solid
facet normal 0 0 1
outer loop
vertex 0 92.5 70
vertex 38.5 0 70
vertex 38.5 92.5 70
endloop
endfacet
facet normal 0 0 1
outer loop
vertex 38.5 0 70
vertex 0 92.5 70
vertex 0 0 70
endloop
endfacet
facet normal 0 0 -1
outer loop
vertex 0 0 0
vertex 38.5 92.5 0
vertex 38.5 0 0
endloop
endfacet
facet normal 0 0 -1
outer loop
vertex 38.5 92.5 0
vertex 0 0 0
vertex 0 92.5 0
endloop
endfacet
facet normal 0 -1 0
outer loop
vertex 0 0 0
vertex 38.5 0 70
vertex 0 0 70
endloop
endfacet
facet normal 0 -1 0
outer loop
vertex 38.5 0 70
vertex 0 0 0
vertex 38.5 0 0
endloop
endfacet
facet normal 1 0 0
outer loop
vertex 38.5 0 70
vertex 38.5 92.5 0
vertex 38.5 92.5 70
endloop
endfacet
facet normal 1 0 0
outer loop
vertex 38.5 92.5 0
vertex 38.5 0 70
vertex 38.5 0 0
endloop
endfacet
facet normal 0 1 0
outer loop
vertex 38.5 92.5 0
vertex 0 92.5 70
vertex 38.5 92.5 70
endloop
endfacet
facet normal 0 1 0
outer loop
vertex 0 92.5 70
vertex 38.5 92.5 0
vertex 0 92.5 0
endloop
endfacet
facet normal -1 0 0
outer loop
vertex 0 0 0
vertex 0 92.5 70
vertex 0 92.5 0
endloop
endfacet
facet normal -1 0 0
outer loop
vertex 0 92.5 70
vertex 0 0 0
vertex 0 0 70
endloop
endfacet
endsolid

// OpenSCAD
width = 36.5;
height = 90.5;
depth = 70;
thickness = 1;

cube([ width + thickness * 2, height + thickness * 2, depth ]);
